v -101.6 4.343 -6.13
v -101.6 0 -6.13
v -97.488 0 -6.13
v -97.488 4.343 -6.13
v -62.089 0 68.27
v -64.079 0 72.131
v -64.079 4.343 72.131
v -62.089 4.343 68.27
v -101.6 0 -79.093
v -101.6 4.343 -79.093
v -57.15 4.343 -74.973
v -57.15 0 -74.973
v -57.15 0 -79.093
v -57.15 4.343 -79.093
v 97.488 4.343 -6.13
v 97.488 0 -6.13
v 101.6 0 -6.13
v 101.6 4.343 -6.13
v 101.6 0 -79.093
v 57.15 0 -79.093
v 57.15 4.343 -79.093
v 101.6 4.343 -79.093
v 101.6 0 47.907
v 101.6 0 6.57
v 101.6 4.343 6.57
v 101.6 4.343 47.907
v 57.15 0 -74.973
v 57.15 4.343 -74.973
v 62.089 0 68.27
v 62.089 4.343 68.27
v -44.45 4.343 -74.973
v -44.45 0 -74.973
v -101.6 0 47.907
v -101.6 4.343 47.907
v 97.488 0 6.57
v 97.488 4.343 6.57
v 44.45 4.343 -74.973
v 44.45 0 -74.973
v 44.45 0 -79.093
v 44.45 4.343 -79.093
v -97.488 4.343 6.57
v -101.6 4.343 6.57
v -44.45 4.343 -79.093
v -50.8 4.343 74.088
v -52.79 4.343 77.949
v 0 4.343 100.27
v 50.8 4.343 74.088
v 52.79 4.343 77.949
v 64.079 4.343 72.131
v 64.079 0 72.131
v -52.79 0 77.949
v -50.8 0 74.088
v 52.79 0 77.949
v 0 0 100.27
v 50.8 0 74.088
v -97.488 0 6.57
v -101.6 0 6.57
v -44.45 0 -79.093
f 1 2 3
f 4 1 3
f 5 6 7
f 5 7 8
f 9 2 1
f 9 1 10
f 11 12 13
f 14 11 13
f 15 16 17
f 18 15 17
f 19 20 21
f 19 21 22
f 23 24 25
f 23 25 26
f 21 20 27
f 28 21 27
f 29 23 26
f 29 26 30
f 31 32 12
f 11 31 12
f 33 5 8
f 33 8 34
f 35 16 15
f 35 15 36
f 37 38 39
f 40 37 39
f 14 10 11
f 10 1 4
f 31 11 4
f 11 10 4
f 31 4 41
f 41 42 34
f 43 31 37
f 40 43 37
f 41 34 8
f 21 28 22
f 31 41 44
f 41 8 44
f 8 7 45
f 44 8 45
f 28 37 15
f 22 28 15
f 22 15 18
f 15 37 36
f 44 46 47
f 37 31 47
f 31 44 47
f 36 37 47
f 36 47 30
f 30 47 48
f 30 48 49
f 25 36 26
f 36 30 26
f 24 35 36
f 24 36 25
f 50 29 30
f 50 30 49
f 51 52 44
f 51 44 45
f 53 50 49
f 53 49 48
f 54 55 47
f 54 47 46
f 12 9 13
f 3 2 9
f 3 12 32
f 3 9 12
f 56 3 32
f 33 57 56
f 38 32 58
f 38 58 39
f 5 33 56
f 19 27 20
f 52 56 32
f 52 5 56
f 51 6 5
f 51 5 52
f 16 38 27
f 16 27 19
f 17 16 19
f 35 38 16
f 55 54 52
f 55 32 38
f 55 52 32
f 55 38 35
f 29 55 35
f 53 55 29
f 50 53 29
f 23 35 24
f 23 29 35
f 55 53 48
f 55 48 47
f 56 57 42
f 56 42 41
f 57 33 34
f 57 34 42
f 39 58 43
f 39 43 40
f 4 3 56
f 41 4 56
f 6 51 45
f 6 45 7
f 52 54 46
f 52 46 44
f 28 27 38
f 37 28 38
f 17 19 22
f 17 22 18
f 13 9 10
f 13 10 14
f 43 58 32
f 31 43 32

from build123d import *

# Parameters (mm, degrees)
F0_W     = 12.7
F0_H     = 4.3434
F1_DEPTH = 4.3434
F2_W     = 4.3434
F2_H     = 12.7
F3_DEPTH = 4.3444
F5_DEPTH = 4.3444


with BuildPart() as f1:
    # F0 (on Front) → F1 (new body)
    with BuildSketch(Plane.XZ):
        Polygon((50.8, 74.088349), (0, 100.27007), (-50.8, 74.088349), (-62.088889, 68.270189), (-101.6, 47.906629), (-101.6, -79.093371), (-57.15, -79.093371), (-57.15, -74.749971), (-44.45, -74.749971), (-44.45, -79.093371), (44.45, -79.093371), (44.45, -74.749971), (57.15, -74.749971), (57.15, -79.093371), (101.6, -79.093371), (101.6, 47.906629), (62.088889, 68.270189), align=None)
        Polygon((-62.088889, 68.270189), (-50.8, 74.088349), (-52.789811, 77.949149), (-64.0787, 72.130989), align=None)
        Polygon((52.789811, 77.949149), (50.8, 74.088349), (62.088889, 68.270189), (64.0787, 72.130989), align=None)
        with Locations((-50.8, -76.921671)):
            Rectangle(F0_W, F0_H)
        Polygon((50.8, -79.093371), (57.15, -79.093371), (57.15, -74.749971), (44.45, -74.749971), (44.45, -79.093371), align=None)
    extrude(amount=-F1_DEPTH)

    # F2 (on Front) → F3 (cut, through all)
    with BuildSketch(Plane.XZ):
        with Locations((-99.660009, 0.220258)):
            Rectangle(F2_W, F2_H)
        with Locations((99.660009, 0.220258)):
            Rectangle(F2_W, F2_H)
    extrude(amount=-F3_DEPTH, mode=Mode.SUBTRACT)

    # F4 (on Front) → F5 (cut, through all)
    with BuildSketch(Plane.XZ):
        Polygon((-57.15, -79.316832), (-50.8, -79.316832), (-44.45, -79.316832), (-44.45, -74.973432), (-50.8, -74.973432), (-57.15, -74.973432), align=None)
        Polygon((57.15, -79.316832), (57.15, -74.973432), (50.8, -74.973432), (44.45, -74.973432), (44.45, -79.316832), (50.8, -79.316832), align=None)
    extrude(amount=-F5_DEPTH, mode=Mode.SUBTRACT)


solid = f1.part
